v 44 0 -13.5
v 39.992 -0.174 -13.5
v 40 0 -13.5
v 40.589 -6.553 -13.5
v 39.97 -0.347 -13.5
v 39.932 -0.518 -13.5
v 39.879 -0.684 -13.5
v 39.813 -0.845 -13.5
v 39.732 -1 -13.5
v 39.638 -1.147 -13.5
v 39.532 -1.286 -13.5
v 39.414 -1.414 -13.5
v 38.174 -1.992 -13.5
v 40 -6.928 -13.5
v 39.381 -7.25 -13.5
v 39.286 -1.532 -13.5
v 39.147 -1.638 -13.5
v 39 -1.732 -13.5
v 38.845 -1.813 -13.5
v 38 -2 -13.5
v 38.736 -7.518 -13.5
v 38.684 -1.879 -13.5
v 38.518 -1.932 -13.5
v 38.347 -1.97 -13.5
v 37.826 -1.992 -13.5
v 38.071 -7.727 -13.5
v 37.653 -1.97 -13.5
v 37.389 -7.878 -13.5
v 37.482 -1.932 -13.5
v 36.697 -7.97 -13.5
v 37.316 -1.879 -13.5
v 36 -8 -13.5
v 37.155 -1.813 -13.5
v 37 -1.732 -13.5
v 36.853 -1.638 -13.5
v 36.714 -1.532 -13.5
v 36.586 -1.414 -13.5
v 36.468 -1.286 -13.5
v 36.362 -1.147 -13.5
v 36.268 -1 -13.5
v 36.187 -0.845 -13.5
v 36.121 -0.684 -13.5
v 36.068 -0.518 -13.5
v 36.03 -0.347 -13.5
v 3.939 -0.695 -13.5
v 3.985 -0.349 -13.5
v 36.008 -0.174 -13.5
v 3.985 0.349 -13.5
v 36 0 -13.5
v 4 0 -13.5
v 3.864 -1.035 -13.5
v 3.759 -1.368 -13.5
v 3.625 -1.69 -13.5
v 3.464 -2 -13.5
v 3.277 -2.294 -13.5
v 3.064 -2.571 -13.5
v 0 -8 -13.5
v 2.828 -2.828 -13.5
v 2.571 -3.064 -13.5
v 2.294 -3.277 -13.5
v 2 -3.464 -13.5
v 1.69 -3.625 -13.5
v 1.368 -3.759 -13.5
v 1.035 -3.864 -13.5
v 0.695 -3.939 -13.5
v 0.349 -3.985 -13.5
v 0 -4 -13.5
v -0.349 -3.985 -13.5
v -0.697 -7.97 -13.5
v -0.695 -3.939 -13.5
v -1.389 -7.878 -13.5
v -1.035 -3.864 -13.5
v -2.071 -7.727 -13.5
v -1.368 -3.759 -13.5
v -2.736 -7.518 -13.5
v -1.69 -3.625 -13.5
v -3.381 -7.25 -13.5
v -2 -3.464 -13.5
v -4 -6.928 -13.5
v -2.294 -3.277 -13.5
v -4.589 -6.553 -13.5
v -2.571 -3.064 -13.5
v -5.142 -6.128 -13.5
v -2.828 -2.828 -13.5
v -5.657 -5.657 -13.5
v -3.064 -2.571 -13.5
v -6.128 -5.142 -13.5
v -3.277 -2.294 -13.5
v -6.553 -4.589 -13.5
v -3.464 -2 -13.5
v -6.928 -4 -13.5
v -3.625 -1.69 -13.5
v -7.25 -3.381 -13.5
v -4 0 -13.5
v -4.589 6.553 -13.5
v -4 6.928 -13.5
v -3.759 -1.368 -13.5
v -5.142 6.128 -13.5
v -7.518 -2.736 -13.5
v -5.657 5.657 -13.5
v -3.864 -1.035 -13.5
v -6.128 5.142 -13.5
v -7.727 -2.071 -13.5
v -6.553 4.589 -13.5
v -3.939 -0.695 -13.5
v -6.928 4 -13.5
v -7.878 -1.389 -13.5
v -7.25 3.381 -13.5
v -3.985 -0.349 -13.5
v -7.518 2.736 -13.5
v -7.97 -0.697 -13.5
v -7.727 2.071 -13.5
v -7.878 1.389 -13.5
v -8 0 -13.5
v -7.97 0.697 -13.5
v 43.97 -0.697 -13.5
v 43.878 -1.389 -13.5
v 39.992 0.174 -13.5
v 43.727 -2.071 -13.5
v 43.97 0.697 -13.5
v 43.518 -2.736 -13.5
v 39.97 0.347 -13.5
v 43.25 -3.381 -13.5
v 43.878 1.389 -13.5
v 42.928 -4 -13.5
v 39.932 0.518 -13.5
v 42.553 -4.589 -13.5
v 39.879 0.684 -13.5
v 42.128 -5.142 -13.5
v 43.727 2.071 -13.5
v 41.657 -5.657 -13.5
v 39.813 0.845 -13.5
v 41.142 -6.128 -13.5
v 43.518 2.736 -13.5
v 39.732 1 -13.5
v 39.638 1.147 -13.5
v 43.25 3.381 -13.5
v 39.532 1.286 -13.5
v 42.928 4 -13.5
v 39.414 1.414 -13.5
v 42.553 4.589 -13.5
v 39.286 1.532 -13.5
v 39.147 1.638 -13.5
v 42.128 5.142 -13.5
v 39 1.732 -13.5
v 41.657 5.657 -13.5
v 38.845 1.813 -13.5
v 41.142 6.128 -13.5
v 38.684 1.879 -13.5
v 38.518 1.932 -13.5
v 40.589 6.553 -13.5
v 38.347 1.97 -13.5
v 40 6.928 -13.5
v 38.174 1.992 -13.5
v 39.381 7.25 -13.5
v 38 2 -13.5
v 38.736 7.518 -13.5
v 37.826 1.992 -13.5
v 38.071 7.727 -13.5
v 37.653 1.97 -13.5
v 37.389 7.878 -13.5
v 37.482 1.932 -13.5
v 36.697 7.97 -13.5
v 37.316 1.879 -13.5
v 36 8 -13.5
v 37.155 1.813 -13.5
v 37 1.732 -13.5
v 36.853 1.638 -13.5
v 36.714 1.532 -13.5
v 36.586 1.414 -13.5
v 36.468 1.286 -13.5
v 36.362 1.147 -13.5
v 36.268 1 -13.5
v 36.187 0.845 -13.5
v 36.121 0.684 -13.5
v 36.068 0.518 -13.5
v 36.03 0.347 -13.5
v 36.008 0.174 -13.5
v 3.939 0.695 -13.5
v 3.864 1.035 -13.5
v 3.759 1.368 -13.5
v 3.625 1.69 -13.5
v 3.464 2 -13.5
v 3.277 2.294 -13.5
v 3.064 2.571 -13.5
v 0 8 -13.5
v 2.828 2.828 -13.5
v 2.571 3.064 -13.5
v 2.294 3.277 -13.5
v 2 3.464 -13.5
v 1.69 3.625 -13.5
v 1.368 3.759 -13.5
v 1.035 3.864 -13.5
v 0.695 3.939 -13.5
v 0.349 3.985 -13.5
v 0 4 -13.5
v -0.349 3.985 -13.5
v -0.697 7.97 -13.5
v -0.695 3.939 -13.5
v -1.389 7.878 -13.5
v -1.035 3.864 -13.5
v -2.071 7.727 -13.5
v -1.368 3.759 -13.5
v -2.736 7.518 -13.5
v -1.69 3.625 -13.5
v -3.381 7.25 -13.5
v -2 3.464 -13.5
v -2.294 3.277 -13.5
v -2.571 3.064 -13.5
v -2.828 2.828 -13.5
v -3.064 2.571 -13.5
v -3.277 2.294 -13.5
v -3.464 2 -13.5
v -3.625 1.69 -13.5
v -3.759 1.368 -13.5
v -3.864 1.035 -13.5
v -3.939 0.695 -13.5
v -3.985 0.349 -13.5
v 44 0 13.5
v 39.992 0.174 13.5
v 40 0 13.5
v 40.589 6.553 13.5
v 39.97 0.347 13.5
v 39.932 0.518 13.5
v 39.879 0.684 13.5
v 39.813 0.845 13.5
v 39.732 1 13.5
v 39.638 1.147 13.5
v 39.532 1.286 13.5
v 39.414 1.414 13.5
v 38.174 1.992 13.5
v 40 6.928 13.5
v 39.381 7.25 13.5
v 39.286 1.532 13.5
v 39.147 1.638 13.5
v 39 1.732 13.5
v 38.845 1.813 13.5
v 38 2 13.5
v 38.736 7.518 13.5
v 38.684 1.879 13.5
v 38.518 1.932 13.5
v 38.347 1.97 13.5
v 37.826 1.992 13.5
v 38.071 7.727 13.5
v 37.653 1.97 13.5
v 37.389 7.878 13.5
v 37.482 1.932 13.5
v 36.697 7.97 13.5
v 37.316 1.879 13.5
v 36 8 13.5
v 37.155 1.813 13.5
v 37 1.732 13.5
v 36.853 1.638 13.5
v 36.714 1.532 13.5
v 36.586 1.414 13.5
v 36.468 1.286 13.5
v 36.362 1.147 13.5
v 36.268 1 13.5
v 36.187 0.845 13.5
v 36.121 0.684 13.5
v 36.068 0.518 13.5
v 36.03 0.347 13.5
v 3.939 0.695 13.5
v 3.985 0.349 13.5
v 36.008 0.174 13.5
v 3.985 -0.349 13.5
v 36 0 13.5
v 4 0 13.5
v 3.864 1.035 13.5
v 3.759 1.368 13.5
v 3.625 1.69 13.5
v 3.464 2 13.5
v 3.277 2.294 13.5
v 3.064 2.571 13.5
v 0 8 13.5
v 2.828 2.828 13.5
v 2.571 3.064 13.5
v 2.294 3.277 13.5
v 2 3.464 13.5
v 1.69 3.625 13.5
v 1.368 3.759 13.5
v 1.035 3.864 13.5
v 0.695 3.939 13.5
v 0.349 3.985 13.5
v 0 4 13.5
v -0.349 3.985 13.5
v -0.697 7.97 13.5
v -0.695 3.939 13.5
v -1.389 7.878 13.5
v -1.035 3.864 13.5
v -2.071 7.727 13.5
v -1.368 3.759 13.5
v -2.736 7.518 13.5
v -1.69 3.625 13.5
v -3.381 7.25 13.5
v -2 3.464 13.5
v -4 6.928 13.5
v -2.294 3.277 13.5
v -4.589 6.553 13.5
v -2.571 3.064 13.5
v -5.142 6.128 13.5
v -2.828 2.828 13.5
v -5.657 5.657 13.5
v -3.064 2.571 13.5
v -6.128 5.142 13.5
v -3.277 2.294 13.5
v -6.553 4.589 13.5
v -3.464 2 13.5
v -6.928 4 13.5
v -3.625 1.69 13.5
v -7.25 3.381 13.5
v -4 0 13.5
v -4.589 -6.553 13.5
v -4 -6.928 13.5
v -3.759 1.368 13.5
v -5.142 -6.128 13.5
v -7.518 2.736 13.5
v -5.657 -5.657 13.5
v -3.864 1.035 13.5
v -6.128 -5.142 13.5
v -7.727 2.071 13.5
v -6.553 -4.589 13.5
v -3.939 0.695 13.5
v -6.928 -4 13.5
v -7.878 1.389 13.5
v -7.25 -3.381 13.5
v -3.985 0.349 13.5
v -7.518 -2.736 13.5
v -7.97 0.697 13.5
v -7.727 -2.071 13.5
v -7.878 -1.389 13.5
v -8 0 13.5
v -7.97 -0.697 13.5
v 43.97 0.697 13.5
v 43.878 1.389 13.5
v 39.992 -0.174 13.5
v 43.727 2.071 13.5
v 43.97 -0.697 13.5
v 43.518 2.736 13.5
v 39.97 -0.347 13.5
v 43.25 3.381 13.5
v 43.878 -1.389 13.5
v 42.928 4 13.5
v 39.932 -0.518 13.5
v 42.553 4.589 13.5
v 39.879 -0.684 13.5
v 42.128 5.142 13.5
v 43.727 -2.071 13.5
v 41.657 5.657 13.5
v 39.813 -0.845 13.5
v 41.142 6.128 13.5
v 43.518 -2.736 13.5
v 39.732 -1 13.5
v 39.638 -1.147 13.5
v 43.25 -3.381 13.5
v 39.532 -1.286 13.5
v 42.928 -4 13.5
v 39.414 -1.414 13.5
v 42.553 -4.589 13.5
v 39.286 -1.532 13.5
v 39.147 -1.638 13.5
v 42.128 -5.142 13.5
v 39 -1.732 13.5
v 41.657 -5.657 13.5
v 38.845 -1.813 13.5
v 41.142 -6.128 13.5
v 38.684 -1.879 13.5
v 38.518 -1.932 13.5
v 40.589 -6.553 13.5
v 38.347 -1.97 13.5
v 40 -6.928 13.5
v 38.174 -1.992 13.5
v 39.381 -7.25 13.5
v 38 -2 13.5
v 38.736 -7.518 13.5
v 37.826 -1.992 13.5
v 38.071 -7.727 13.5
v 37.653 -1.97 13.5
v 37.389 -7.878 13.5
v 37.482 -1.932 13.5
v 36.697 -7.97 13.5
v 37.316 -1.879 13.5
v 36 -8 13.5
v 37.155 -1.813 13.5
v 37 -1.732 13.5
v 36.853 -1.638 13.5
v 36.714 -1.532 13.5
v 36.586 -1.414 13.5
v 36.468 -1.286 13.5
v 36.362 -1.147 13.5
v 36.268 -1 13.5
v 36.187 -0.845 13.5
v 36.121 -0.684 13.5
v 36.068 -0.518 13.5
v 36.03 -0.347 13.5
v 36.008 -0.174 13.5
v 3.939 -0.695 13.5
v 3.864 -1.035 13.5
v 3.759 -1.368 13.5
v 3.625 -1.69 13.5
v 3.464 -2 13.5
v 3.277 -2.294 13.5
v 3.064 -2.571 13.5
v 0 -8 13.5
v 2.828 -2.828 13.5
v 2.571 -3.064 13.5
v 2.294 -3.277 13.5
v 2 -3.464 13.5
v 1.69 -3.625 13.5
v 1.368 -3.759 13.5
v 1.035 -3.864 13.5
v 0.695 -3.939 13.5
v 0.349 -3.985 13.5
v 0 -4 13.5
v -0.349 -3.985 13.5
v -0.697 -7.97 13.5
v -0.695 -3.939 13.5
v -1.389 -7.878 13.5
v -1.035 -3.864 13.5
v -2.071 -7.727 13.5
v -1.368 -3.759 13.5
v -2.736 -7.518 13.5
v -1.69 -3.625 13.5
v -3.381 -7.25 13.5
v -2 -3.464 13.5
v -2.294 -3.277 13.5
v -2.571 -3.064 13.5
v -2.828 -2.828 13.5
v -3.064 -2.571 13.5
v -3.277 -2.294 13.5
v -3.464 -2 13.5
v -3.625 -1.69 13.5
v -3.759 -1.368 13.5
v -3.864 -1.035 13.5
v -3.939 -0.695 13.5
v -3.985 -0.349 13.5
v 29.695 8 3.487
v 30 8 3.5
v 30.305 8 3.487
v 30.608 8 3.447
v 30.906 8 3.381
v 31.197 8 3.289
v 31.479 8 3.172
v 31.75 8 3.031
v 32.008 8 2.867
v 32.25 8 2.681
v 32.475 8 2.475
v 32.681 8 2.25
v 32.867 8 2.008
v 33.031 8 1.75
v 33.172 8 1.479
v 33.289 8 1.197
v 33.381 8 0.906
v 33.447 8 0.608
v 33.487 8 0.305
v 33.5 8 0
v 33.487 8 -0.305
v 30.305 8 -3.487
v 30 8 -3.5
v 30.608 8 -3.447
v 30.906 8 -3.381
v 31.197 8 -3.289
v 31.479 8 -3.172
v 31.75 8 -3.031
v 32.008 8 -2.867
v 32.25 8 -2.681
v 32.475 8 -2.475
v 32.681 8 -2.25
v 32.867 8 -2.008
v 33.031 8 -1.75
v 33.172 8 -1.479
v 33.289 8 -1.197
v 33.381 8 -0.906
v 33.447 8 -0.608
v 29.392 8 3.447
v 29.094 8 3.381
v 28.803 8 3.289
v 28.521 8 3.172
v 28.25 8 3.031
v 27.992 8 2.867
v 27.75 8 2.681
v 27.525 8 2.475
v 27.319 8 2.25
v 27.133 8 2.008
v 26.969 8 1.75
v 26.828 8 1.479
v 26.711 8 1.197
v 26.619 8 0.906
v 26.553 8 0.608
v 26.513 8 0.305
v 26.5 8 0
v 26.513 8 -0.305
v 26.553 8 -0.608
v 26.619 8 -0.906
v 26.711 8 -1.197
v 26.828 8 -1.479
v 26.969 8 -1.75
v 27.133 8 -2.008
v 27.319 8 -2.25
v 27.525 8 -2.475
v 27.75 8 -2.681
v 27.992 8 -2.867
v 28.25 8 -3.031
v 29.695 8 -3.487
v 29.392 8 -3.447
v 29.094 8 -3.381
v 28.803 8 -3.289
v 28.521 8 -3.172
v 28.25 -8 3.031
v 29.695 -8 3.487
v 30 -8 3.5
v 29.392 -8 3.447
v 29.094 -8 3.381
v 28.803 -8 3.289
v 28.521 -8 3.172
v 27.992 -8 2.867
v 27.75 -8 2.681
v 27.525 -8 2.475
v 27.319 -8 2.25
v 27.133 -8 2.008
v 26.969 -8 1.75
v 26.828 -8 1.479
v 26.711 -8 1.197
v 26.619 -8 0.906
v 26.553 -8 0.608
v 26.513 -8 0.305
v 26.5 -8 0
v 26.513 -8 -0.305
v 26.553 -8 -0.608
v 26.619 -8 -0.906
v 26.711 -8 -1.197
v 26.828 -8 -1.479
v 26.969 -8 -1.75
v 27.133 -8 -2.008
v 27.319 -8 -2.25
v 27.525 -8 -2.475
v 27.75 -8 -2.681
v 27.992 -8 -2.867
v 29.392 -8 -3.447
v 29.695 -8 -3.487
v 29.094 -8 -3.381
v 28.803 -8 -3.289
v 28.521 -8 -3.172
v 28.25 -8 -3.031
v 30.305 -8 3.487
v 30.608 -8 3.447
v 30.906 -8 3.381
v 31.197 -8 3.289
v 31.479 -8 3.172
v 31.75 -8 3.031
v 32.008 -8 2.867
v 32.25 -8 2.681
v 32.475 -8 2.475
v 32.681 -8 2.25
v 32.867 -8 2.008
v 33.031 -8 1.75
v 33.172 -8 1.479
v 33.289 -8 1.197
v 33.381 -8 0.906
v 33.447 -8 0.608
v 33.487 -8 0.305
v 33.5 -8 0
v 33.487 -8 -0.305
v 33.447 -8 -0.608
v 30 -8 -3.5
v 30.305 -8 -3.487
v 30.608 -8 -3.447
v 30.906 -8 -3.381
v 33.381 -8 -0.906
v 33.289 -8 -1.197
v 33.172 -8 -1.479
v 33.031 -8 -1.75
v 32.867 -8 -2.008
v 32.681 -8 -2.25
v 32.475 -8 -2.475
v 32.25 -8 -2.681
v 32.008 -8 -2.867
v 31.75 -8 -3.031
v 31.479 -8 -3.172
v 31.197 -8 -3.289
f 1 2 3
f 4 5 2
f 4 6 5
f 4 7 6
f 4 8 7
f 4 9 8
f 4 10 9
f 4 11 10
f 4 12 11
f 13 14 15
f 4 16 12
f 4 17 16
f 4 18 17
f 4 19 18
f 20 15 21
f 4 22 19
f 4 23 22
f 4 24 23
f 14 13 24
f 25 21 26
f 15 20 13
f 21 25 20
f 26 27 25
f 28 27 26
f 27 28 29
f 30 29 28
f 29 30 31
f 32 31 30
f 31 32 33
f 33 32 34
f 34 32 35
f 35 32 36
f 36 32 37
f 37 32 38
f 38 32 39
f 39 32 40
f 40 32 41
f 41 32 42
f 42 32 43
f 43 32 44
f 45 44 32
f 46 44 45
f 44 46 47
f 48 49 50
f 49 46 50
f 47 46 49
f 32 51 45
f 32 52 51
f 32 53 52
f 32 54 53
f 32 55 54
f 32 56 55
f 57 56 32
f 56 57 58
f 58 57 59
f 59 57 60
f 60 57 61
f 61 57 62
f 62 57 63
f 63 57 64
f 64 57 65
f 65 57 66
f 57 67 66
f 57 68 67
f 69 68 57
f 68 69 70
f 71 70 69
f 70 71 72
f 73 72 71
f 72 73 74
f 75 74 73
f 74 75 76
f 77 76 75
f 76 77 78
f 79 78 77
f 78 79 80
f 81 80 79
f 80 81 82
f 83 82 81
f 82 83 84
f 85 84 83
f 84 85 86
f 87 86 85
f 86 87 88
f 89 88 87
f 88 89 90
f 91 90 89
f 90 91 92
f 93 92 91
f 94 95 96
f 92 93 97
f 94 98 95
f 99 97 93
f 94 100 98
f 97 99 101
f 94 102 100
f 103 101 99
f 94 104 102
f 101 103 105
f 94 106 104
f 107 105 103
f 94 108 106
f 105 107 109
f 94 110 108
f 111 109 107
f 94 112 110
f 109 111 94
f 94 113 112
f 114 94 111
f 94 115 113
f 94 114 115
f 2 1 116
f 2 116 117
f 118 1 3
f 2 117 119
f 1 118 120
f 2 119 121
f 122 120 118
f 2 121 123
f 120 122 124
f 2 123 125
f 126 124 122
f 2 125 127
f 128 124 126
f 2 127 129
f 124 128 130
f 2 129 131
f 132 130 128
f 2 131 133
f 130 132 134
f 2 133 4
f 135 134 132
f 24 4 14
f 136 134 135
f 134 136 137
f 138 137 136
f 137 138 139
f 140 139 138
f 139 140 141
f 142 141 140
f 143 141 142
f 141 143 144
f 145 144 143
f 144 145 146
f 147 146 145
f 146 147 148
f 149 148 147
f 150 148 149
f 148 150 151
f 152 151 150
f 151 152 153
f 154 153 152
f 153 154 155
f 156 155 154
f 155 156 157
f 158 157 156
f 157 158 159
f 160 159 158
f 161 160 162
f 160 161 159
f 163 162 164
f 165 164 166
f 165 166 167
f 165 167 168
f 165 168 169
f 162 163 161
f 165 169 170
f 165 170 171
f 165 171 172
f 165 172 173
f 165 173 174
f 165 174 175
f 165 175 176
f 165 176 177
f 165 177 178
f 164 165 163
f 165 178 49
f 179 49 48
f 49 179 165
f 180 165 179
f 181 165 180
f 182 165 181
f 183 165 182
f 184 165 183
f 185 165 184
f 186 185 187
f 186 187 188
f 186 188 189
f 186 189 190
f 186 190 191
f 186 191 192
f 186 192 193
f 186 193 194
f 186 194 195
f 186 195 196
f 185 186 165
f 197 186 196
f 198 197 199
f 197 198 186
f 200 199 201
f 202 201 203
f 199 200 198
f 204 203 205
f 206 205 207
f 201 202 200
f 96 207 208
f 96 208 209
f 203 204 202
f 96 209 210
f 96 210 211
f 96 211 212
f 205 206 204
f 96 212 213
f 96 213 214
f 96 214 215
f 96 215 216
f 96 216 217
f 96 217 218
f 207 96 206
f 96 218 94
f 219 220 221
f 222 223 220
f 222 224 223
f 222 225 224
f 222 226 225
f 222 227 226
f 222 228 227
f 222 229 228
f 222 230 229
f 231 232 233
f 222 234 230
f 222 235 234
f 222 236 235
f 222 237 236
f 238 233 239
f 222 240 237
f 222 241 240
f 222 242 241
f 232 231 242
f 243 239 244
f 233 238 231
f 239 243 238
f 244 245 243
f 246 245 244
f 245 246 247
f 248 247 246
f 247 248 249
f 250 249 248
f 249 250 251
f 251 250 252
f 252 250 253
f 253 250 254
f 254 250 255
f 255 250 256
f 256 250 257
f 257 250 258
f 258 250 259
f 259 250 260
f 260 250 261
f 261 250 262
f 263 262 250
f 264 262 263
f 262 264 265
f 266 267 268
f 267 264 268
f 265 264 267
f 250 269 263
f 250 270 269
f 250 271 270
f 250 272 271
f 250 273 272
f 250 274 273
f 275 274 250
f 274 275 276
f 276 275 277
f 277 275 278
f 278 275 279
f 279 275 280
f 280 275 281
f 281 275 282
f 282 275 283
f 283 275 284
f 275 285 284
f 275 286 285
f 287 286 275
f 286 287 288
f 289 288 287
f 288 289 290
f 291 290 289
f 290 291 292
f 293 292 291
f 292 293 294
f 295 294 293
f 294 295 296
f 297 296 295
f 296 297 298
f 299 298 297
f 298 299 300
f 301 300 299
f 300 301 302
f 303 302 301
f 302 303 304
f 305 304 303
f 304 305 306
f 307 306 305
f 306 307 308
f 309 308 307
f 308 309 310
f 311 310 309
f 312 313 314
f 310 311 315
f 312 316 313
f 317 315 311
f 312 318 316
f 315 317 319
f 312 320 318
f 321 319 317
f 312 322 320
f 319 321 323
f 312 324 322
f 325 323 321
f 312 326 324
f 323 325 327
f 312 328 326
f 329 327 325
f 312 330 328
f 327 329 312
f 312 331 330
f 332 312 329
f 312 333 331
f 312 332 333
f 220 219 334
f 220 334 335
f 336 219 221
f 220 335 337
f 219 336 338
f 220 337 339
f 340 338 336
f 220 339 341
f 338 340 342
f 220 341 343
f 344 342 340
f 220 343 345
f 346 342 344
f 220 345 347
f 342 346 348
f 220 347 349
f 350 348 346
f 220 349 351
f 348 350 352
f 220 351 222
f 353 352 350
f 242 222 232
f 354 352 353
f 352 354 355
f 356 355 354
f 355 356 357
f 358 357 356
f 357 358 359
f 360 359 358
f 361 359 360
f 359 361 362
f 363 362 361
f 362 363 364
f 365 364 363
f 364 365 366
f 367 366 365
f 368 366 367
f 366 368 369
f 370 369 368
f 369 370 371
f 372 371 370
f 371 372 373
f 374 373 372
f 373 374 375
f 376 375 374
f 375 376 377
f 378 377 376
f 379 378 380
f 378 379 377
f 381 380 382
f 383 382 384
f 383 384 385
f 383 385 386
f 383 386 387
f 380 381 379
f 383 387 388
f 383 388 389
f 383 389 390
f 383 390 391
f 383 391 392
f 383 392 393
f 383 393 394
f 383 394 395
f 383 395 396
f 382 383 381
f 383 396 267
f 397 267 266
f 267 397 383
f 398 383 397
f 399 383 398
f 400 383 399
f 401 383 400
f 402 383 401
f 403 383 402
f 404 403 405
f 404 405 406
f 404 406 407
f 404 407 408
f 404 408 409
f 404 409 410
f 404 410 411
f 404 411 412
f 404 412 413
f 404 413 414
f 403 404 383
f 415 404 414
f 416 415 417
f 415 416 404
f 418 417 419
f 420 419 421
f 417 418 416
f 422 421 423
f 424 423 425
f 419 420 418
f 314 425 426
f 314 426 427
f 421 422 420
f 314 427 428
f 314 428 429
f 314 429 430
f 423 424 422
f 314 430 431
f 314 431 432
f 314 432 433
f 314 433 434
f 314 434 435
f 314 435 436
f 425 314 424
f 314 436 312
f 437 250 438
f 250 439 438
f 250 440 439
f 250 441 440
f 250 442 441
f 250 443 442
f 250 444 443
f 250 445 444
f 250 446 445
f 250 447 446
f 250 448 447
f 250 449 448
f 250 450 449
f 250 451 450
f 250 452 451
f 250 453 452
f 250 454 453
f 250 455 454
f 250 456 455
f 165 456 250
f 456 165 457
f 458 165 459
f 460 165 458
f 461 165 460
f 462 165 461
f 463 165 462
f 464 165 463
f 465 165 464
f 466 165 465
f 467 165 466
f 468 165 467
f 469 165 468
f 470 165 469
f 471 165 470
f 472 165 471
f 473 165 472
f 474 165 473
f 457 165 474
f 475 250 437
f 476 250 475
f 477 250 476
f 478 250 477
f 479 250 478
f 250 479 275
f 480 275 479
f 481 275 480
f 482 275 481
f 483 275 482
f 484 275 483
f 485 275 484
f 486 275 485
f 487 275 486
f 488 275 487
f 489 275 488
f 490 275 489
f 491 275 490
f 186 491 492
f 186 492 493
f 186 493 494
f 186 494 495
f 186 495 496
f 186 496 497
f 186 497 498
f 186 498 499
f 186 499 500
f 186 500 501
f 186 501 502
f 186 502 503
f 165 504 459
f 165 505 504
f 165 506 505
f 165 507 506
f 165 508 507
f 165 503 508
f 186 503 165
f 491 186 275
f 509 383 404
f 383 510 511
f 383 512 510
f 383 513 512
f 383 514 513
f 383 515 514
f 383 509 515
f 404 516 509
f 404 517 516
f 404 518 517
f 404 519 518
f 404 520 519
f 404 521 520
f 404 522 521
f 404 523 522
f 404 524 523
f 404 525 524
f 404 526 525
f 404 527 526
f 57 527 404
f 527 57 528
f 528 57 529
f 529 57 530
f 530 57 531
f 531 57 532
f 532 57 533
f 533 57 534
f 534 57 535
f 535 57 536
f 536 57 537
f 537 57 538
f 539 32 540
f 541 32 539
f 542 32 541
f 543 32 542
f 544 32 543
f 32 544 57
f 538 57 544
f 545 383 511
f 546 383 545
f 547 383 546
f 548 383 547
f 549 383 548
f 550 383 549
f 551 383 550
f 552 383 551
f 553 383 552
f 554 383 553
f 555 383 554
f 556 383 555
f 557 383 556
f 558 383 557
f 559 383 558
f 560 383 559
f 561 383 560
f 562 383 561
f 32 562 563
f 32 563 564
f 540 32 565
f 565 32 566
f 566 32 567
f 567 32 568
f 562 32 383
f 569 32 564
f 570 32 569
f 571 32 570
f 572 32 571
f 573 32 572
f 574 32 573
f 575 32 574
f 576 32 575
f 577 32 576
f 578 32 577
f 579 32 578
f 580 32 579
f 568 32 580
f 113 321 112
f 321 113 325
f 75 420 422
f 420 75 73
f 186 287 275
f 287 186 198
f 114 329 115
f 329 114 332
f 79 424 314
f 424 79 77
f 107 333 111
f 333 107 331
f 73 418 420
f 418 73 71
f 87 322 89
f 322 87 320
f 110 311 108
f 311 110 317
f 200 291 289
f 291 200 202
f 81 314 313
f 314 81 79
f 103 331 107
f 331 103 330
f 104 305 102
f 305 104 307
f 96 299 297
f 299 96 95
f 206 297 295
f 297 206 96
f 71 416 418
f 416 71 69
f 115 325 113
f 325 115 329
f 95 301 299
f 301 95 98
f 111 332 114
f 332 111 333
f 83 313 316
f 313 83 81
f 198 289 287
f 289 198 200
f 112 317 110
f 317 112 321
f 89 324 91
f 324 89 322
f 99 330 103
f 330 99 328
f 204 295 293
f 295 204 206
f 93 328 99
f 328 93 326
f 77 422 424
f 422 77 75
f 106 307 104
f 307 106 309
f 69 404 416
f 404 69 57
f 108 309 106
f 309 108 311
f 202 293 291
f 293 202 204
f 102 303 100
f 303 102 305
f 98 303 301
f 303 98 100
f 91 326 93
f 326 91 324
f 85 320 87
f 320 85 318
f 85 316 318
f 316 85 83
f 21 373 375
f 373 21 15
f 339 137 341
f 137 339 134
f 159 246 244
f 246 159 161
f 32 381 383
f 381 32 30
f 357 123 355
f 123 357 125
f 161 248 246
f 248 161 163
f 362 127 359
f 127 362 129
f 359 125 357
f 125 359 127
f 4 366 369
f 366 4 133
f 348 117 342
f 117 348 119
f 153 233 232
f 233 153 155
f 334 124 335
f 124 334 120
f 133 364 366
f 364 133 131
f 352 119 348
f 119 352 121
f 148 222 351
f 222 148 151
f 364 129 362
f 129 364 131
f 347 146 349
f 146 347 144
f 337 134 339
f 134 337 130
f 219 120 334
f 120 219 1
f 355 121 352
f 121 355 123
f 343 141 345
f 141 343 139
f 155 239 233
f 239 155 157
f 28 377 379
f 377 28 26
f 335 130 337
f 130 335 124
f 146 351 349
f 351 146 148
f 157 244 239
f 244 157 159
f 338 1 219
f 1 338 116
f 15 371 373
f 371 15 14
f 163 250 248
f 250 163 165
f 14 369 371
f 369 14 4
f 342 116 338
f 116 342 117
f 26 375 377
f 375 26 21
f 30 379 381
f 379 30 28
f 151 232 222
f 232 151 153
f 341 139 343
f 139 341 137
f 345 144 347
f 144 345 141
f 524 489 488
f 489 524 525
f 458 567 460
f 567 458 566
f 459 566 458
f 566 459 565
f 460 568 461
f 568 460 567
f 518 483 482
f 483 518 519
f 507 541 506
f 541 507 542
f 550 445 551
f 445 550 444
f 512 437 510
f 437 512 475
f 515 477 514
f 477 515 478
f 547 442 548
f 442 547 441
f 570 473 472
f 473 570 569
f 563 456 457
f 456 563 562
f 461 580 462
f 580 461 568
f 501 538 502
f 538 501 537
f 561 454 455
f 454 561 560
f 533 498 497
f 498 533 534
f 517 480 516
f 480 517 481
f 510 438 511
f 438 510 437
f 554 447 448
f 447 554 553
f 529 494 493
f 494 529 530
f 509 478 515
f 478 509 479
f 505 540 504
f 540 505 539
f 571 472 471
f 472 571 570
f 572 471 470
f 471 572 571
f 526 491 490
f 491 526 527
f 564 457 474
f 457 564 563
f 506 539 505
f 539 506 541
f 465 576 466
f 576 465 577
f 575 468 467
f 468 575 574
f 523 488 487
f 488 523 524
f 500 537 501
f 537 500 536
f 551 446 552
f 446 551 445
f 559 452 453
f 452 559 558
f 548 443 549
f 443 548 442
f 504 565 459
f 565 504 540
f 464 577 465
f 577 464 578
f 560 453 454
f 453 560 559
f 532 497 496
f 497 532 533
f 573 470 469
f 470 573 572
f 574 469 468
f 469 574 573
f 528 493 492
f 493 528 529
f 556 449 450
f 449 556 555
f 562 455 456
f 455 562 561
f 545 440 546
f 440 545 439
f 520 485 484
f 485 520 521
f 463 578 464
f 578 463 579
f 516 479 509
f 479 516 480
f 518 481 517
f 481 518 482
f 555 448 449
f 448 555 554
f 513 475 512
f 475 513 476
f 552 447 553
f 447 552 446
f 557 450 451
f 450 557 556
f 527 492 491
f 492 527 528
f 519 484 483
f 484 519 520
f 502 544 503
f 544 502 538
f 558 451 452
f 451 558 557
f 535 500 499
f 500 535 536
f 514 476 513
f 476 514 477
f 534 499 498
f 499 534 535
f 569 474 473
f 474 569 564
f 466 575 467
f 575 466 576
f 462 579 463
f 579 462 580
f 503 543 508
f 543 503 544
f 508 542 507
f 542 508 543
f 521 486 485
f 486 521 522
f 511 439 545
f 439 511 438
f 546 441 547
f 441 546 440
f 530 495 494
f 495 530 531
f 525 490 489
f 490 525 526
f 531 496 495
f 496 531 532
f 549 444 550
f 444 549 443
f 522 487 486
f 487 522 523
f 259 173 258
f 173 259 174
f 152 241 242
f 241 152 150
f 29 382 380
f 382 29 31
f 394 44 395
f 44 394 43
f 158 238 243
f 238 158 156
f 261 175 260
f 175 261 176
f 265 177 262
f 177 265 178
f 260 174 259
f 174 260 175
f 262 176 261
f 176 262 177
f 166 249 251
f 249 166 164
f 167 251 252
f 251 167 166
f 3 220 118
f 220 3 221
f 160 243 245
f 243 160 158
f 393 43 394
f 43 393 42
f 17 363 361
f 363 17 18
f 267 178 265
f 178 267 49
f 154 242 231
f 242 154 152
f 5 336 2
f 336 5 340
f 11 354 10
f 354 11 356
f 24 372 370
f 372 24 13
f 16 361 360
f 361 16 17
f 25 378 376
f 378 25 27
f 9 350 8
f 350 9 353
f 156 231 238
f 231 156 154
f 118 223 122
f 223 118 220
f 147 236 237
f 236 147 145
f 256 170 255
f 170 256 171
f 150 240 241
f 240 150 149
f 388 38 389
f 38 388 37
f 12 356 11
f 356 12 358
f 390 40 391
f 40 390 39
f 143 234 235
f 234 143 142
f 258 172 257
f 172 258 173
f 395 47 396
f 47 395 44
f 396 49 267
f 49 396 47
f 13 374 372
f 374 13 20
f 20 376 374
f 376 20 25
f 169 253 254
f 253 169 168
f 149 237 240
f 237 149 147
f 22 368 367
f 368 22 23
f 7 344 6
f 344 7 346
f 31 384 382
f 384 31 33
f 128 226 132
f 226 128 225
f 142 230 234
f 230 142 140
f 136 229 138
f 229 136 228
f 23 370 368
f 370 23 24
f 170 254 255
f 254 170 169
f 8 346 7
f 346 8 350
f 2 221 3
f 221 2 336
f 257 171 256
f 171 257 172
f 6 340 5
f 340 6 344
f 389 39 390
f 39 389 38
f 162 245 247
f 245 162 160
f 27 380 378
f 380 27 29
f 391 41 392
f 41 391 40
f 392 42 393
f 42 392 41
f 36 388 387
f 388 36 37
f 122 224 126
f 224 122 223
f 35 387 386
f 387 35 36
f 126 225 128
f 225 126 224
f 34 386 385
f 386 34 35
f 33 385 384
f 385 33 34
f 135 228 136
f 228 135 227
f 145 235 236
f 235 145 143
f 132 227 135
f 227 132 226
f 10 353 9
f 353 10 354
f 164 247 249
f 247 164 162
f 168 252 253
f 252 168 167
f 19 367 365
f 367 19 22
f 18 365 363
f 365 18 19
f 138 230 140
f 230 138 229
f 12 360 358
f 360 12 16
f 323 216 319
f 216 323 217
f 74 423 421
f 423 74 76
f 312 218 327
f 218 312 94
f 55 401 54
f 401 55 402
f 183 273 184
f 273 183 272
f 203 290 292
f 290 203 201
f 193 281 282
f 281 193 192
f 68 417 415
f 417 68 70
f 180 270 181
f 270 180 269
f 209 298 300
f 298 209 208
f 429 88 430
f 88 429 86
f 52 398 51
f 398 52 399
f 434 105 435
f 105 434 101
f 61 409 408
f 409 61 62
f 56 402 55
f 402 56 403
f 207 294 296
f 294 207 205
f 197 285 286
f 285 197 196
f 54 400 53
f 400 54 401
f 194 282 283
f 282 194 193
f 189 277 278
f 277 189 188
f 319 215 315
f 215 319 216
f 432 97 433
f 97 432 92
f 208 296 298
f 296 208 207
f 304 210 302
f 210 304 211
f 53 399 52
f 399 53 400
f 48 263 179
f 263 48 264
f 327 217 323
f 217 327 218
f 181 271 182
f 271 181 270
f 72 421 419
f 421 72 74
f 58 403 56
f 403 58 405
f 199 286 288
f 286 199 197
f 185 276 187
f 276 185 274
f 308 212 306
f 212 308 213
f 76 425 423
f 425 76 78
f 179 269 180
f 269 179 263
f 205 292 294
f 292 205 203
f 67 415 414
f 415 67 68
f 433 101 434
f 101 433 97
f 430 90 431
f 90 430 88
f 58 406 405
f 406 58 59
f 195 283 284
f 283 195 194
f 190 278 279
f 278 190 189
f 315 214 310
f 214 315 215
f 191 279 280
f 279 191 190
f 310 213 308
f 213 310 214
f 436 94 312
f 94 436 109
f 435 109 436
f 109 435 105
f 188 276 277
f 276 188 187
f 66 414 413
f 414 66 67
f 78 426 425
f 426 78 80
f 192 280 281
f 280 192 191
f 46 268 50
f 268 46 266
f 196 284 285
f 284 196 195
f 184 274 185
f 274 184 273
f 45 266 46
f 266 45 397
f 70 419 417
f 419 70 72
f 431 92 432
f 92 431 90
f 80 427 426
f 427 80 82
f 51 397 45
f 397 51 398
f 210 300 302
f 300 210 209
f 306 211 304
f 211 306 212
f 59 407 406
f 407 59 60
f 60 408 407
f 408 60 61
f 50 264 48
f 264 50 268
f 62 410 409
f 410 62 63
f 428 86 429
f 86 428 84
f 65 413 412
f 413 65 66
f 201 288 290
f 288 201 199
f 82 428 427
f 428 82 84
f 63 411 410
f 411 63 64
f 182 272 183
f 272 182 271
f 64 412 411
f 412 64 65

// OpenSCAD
$fn = 72;



MountHeight = 30;
MountThickness = 16;
SupportDepth = MountHeight+8;
MountDepth = SupportDepth+6 - MountThickness/2;

ShaftHeight = MountHeight;
ShaftRadius = 3.5;
PadWidth=27;

AnchorRadius = 2;
AttachRadius = 4;


rotate([0,90,0])
difference() {
    union() {
        translate([-PadWidth/2,-MountThickness/2,0])
            cube([PadWidth,MountThickness,MountDepth]);

        rotate([0,90,0])
            translate([0,0,-PadWidth/2])        
                cylinder(r=MountThickness/2,h=PadWidth);
        
        translate([0,0,MountDepth])
        rotate([0,90,0])
            translate([0,0, -PadWidth/2])        
                cylinder(r=MountThickness/2,h=PadWidth);
    }
    
    union () {
        translate([0,0,ShaftHeight])
            rotate([90,0,0])
                translate([0,0,-(MountThickness+2)/2])        
                    cylinder(r=ShaftRadius,h=MountThickness+2);
        
        translate([0,0, SupportDepth])
        rotate([0,90,0])
            translate([0,0,-(PadWidth+2)/2])        
                cylinder(r=AnchorRadius,h=PadWidth+2);

        rotate([0,90,0])
            translate([0,0,-(PadWidth+2)/2])        
                cylinder(r=AttachRadius,h=PadWidth+2);
    }
}


module Corner(radius, length){
translate([-radius,-radius,0])
        difference() {
                cube([radius, radius, length]);
            translate([0,0,-1])
            cylinder(r=radius,h=length+2);
        }  
}
